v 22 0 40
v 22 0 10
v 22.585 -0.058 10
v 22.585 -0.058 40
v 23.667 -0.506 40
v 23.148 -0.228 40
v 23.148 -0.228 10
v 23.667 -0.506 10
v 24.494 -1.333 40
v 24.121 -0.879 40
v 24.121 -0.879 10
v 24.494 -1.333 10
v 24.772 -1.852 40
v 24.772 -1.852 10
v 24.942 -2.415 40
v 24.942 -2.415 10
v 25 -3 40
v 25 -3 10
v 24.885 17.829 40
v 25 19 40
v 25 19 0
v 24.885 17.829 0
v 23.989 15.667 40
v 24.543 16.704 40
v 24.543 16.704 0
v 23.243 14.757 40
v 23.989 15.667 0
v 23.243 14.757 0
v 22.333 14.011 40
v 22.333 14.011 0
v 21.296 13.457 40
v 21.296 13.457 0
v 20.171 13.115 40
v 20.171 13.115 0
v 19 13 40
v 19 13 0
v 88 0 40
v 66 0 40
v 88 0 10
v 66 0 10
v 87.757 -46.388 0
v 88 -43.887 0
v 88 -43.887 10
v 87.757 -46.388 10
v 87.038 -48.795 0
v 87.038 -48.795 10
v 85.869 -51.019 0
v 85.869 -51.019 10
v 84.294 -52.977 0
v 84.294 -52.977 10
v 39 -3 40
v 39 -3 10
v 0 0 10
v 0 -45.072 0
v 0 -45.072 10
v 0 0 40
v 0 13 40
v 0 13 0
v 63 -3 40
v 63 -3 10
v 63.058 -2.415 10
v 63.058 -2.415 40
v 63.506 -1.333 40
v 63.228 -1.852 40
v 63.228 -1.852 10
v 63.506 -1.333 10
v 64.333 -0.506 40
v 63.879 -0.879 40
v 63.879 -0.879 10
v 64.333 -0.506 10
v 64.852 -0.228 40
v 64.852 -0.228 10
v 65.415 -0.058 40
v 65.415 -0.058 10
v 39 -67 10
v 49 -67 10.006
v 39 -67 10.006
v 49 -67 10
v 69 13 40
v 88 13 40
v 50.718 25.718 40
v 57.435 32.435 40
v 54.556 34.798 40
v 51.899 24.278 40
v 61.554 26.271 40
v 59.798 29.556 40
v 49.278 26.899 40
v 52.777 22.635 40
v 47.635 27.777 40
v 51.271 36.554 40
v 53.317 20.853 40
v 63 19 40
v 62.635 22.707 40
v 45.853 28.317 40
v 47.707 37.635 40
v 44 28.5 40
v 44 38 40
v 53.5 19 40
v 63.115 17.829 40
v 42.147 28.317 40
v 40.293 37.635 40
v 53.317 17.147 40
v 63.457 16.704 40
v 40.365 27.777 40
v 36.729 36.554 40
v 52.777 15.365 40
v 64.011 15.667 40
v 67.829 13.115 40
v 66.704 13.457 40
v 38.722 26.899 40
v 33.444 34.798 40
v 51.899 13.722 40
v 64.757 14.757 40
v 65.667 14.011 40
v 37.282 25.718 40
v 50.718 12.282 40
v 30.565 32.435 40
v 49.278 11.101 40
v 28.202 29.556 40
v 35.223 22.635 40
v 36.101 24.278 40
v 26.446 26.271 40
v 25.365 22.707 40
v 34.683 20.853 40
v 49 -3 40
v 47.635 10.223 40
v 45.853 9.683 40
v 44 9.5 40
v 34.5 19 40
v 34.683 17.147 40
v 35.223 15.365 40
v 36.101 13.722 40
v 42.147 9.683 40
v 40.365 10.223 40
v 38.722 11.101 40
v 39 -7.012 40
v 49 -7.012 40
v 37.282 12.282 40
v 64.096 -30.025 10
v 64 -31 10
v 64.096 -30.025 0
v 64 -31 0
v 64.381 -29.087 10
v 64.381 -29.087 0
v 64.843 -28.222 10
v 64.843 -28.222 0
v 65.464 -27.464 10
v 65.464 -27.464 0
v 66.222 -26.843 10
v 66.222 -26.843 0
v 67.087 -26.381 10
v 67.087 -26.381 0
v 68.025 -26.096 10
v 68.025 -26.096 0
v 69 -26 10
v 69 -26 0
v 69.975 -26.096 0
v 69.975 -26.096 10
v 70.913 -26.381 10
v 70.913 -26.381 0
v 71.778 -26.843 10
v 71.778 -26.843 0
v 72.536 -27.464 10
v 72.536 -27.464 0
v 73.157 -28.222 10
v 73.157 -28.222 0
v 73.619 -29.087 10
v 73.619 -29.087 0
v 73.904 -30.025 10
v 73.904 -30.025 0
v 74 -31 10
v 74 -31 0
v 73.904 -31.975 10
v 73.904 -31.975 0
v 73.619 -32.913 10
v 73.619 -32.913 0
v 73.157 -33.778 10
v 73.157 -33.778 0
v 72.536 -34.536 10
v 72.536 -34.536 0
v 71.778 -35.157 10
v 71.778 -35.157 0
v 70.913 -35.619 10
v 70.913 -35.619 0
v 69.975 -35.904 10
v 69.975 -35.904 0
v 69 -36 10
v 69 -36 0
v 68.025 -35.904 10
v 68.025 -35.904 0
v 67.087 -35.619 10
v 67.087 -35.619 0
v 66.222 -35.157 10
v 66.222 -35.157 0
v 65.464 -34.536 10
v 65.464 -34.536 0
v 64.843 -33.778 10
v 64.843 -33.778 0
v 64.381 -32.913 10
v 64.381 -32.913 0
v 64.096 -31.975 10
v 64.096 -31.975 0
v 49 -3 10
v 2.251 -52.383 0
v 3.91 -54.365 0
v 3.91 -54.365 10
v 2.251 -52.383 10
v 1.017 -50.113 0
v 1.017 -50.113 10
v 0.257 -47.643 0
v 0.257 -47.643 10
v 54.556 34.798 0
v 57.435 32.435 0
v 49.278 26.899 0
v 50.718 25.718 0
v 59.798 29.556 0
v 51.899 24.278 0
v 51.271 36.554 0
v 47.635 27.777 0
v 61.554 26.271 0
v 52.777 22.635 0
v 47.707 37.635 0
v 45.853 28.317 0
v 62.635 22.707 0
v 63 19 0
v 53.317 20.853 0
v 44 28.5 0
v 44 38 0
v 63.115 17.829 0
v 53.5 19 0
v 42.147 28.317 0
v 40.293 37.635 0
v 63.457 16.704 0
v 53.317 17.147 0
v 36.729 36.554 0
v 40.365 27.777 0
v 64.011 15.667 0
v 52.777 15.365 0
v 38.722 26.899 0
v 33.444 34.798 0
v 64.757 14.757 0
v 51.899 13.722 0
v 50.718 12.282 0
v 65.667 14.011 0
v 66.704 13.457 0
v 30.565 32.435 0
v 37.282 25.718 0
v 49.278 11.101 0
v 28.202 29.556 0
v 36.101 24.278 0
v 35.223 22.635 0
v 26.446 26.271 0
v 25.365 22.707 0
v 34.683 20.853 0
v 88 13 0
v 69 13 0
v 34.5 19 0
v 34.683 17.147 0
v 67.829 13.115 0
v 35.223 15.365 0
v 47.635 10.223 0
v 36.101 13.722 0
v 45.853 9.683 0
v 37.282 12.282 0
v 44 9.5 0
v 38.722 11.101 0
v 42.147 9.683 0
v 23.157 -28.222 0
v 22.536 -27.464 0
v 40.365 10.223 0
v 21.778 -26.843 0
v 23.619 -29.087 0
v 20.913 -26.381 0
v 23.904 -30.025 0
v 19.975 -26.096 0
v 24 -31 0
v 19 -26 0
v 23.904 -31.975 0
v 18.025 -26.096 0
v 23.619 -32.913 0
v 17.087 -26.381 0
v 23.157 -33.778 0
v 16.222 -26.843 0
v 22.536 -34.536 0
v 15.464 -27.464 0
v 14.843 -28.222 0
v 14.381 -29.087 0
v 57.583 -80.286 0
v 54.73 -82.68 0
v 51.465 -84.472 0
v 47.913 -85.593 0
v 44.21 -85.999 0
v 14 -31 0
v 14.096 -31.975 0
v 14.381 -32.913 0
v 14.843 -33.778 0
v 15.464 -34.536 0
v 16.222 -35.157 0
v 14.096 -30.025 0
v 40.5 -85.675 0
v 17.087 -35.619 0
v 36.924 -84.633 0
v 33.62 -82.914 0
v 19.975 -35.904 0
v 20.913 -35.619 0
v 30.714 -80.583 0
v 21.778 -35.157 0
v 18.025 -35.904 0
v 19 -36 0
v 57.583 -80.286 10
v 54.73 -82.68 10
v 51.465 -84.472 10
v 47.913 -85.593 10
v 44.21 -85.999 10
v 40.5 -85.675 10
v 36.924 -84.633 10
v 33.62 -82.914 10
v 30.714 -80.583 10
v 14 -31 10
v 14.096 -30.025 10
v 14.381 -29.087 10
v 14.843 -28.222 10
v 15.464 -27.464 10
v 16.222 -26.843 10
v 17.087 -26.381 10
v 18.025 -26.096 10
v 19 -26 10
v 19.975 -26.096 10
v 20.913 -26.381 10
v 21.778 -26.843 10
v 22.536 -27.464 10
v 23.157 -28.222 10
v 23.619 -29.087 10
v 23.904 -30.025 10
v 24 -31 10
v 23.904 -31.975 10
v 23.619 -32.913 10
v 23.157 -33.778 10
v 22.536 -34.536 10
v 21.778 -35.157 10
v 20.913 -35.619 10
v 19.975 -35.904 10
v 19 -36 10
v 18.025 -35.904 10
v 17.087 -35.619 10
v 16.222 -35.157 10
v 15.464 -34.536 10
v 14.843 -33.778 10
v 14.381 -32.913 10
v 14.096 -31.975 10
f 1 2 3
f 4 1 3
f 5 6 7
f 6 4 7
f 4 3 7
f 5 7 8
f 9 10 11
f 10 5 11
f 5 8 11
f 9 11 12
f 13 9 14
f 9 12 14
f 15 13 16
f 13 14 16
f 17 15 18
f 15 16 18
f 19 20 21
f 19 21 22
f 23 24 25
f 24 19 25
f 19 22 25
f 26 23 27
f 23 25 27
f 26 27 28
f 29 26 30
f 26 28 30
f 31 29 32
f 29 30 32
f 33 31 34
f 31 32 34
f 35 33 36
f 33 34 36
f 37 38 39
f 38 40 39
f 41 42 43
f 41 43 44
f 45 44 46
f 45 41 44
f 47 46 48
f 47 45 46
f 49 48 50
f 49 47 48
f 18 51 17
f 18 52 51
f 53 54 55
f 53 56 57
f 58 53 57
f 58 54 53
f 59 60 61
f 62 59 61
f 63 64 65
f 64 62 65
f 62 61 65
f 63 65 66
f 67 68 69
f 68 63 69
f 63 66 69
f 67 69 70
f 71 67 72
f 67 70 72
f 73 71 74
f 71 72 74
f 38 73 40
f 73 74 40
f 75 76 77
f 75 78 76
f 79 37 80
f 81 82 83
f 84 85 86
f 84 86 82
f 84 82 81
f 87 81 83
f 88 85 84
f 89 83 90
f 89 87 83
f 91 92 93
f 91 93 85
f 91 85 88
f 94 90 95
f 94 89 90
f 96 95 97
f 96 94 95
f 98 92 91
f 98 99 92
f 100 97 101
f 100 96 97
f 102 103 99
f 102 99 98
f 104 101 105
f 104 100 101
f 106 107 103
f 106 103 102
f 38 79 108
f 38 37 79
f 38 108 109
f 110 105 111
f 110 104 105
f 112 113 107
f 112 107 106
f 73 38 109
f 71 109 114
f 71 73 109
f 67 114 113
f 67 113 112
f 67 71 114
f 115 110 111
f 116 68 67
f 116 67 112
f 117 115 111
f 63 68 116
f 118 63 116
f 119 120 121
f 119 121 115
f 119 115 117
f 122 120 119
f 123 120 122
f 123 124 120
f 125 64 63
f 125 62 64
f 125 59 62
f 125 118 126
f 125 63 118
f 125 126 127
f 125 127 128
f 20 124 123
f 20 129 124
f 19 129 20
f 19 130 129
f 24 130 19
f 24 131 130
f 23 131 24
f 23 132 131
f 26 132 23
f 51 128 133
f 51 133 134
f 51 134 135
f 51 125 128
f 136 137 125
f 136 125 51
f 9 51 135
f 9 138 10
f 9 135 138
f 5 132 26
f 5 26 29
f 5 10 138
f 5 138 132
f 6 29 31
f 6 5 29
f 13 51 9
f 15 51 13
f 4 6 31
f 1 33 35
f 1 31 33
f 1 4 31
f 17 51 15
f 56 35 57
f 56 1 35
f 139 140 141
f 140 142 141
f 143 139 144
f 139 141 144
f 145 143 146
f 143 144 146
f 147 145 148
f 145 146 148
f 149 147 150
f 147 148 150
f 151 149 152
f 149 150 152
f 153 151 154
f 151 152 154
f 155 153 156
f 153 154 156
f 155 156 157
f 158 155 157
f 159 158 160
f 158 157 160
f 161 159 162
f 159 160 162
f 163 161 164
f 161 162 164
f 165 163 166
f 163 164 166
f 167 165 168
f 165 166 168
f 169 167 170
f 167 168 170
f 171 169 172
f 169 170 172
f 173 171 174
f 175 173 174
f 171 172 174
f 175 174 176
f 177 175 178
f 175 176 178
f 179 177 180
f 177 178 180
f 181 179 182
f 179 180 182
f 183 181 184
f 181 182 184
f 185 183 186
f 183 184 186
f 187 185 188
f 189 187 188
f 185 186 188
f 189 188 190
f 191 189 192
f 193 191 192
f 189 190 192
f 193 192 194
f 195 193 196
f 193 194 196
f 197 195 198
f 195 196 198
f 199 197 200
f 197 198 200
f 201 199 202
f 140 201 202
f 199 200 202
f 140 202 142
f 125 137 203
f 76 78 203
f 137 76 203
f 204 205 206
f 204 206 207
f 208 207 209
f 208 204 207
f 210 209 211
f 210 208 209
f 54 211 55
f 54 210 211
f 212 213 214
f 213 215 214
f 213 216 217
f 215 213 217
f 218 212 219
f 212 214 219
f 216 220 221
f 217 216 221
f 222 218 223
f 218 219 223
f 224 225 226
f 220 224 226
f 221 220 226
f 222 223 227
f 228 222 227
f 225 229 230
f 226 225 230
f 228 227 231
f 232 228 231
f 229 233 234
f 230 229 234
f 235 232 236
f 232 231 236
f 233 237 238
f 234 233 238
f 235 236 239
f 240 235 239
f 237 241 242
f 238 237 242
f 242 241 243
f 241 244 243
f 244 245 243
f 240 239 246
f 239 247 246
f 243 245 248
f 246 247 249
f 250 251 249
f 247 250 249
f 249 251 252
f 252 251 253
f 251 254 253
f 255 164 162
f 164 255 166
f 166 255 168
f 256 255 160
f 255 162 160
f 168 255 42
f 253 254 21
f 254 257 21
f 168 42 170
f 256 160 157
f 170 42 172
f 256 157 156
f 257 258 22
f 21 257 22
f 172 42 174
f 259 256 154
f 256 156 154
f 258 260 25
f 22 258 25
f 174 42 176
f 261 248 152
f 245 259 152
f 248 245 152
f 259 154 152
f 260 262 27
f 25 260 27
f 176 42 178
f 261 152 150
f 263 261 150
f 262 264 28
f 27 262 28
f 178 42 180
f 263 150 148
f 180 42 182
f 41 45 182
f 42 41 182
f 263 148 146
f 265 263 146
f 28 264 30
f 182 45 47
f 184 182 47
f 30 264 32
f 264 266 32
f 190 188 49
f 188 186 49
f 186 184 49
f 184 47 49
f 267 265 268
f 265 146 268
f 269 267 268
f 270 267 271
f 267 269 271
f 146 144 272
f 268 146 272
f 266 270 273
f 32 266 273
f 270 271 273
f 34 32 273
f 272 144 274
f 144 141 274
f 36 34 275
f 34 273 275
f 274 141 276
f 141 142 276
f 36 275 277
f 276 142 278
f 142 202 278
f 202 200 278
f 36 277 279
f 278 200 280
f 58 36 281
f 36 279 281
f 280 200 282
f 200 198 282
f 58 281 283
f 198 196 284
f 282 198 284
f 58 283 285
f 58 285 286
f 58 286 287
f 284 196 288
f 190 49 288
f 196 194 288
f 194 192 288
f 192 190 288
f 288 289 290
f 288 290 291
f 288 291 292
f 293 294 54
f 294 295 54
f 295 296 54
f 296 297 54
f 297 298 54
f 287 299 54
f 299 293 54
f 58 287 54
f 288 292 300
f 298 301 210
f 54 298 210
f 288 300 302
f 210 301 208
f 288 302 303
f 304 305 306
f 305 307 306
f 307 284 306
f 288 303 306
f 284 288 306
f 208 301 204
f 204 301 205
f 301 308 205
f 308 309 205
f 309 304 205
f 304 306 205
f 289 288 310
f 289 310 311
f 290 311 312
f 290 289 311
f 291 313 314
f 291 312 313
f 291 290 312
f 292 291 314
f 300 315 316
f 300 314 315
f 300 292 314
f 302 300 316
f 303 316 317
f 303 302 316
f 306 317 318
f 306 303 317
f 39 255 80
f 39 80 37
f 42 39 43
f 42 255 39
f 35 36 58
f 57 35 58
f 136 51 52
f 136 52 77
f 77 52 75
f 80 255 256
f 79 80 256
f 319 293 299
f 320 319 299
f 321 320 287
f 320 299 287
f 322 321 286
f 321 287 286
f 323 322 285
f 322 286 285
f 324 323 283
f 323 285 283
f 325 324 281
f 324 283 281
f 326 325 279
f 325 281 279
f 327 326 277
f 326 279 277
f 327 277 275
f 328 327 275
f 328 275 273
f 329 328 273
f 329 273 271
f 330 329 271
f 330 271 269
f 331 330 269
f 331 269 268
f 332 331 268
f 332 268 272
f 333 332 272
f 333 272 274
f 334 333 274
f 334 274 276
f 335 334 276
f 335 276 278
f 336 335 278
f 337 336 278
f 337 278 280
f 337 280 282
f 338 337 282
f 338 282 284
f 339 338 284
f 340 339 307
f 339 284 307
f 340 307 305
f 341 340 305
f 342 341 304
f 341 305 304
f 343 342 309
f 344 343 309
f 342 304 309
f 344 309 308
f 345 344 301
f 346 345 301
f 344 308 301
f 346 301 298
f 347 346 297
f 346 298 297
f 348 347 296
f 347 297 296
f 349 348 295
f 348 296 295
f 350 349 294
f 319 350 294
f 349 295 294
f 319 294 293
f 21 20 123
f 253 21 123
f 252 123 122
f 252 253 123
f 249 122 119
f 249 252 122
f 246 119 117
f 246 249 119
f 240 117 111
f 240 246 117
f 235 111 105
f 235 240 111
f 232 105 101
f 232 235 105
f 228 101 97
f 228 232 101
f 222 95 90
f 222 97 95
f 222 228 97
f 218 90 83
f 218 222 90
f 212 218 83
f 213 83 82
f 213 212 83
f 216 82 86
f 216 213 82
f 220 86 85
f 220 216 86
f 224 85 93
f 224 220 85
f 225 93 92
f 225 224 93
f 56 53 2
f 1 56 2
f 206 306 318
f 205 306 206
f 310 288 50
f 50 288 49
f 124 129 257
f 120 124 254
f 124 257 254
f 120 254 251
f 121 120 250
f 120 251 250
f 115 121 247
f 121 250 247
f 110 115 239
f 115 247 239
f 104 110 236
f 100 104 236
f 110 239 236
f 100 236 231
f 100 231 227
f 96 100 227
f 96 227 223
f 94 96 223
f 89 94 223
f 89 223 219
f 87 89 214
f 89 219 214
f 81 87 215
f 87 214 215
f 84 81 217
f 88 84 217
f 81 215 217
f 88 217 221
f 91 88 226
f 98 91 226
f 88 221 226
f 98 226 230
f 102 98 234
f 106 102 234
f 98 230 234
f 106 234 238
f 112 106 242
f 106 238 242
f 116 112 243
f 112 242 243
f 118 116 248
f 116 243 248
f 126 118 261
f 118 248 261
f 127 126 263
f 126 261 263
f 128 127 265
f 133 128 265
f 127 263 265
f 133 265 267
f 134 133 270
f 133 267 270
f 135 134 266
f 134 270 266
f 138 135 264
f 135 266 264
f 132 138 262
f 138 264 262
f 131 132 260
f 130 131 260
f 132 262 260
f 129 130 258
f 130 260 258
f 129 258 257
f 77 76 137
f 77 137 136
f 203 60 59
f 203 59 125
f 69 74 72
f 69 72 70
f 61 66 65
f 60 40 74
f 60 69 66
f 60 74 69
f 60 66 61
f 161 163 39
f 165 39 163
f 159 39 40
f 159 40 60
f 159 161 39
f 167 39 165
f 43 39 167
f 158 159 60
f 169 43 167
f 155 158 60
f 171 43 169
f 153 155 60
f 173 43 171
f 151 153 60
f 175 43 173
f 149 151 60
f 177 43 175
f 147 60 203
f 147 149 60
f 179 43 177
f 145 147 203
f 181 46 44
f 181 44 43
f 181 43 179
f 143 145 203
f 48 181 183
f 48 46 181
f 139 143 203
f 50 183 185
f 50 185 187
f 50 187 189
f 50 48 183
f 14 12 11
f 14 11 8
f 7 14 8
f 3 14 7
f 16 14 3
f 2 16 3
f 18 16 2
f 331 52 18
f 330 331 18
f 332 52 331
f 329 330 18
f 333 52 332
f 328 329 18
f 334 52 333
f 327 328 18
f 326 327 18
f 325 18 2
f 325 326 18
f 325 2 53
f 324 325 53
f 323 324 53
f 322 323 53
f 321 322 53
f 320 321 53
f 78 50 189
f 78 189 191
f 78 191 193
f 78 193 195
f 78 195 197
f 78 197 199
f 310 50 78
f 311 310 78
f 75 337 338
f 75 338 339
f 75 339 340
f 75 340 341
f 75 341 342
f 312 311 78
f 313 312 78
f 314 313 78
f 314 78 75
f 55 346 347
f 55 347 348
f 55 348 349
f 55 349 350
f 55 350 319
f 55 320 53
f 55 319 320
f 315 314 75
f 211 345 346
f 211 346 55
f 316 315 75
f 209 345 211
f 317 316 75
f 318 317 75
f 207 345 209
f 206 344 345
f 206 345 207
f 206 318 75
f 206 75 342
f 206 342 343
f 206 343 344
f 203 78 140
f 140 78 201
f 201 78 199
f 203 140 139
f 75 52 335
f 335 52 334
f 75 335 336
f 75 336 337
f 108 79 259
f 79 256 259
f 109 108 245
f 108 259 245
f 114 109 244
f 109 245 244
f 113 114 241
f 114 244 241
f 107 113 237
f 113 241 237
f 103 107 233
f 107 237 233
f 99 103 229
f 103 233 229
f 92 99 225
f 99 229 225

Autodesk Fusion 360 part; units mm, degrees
sketch "Sketch" plane through (0, 0, 0) normal (0, 0, 1) x (-1, 0, 0)
  line L0 (-88, 67) -> (0, 67)
  line L1 (0, 67) -> (0, 0)
  line L2 (0, 0) -> (-88, 0)
  line L3 (-88, 0) -> (-88, 67)
  circle A0 centre (-19, 31) radius 5
  circle A1 centre (-69, 31) radius 5
  line L4 (-44, 67) -> (-30.7145, 80.5829) construction
  arc A2 (-30.7145, 80.5829) -> (-57.5829, 80.2855) centre (-44, 67) ccw
  line L5 (-44, 67) -> (-57.5829, 80.2855) construction
  line L6 (-44, 67) -> (-30.7145, 80.5829) construction
  line L7 (-30.7145, 80.5829) -> (0, 50.5408)
  line L8 (-57.5829, 80.2855) -> (-88, 49.1876)
  circle A3 centre (-13, 45.0716) radius 13
  circle A4 centre (-75, 43.8869) radius 13
  line L9 (0, 0) -> (-88, 0)
  line L10 (-63, 3) -> (-25, 3)
  circle A5 centre (-22, 3) radius 3
  circle A6 centre (-66, 3) radius 3
  line L11 (-25, 3) -> (-63, 3)
  line L12 (0, -13) -> (0, 0)
  line L13 (-88, -13) -> (0, -13)
  line L14 (0, 0) -> (-88, 0)
  line L15 (-88, 0) -> (-88, -13)
  line L16 (-44, 67) -> (-39, 67)
  line L17 (-39, 67) -> (-49, 67)
  line L18 (-39, 3) -> (-39, 67)
  line L19 (-49, 67) -> (-49, 3)
  line L20 (-49, 3) -> (-39, 3)
  line L21 (-49, 3) -> (-49, 7)
  line L22 (-39, 3) -> (-49, 3)
  line L23 (-39, 7) -> (-39, 3)
  line L24 (-49, 7) -> (-39, 7)
  circle A7 centre (-44, -19) radius 9.5
  circle A8 centre (-44, -19) radius 19
  line L25 (-44, -13) -> (-44, -19)
  line L26 (0, -13) -> (-44, -13)
  circle A9 centre (-19, -19) radius 6
  line L27 (-44, -13) -> (-44, -19)
  line L28 (-88, -13) -> (-44, -13)
  circle A10 centre (-69, -19) radius 6
  point P0 (-70.5776, 67)
  point P1 (-16.8276, 67)
  dimension "d1" = 67
  dimension "d6" = 10
  dimension "d7" = 10
  dimension "d11" = 19
  dimension "d12" = 50
  dimension "d13" = 13
  dimension "d14" = 13
  dimension "d15" = 88
  dimension "d25" = 31
  dimension "d30" = 3
  dimension "d31" = 3
  dimension "d32" = 38
  dimension "d33" = 13
  dimension "d35" = 64
  dimension "d36" = 10
  dimension "d37" = 4
  dimension "d39" = 19
  dimension "d40" = 19
  dimension "d41" = 38
  dimension "d42" = 6
  dimension "d43" = 6
extrude "Extrude2" add sketch "Sketch" along normal blind 10 contours L0 A2 L7 L8 L16 L17 | L0 L2 L3 A1 L8 A4 L9 L10 A6 L11 L14 L19 L21 | L0 L1 L2 A0 L7 A3 L9 L10 A5 L11 L14 L18 L23 | A1 A4 | A6 | A0 A3 | A5 picked at (-77.2796, 48.9706) picked at (-10.783, 49.7865)
extrude "Extrude3" add sketch "Sketch" along normal blind 40 contours L0 L16 L17 L18 L19 L24
chamfer "Chamfer1" distance 60 distance2 30 1 edges at (44, -67, 40) measured on face at (45.6667, -47, 40)
extrude "Extrude4" add sketch "Sketch" along normal blind 40 contours L10 L11 L18 L19 L20 L21 L22 L23 L24 | L2 L9 L10 A5 A6 L11 L14 L20 L22 | L2 L9 L13 L14 L15 A8 L28 | L2 L9 L12 L13 L14 A8 L26 | L13 A7 A8 L26 L28 | L13 A8 L28 A10 | A10 | L13 A7 A8 L26 L28 | L13 A8 L26 A9
extrude "Extrude5" cut sketch "Sketch" along normal blind 50 contours A10
